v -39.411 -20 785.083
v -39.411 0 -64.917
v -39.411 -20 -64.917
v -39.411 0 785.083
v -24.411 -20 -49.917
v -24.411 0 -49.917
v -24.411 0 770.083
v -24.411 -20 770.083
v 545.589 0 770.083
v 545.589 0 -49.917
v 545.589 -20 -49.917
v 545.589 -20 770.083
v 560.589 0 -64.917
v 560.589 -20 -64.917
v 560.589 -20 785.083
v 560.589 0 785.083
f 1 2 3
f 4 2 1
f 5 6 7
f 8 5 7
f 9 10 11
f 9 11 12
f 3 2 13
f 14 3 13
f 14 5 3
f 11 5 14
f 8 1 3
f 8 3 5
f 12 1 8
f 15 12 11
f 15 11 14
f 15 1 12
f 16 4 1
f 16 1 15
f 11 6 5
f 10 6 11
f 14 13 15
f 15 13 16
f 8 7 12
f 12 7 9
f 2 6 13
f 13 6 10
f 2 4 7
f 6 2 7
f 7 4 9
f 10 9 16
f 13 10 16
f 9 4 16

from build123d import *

# Parameters (mm, degrees)
F0_W     = 600
F0_H     = 850
F0_W_2   = 570
F0_H_2   = 820
F1_DEPTH = 20
F2_W     = 600
F2_H     = 850
F3_DEPTH = 5
F4_W     = 570
F4_H     = 820
F5_DEPTH = 25


with BuildPart() as f1:
    # F0 (on Front) → F1 (new body)
    with BuildSketch(Plane.XZ):
        with Locations((260.588973, 360.083479)):
            Rectangle(F0_W, F0_H)
        with Locations((260.588973, 360.083479)):
            Rectangle(F0_W_2, F0_H_2, mode=Mode.SUBTRACT)
    extrude(amount=F1_DEPTH)

    # F2 (on face) → F3 (join)
    with BuildSketch(Plane.XZ.offset(20)):
        with Locations((260.588973, 360.083479)):
            Rectangle(F2_W, F2_H)
    extrude(amount=-F3_DEPTH)

    # F4 (on face) → F5 (cut)
    with BuildSketch(Plane(origin=(0, -15, 0), x_dir=(-1, 0, 0), z_dir=(0, 1, 0))):
        with Locations((-260.588973, 360.083479)):
            Rectangle(F4_W, F4_H)
    extrude(amount=-F5_DEPTH, mode=Mode.SUBTRACT)


solid = f1.part
